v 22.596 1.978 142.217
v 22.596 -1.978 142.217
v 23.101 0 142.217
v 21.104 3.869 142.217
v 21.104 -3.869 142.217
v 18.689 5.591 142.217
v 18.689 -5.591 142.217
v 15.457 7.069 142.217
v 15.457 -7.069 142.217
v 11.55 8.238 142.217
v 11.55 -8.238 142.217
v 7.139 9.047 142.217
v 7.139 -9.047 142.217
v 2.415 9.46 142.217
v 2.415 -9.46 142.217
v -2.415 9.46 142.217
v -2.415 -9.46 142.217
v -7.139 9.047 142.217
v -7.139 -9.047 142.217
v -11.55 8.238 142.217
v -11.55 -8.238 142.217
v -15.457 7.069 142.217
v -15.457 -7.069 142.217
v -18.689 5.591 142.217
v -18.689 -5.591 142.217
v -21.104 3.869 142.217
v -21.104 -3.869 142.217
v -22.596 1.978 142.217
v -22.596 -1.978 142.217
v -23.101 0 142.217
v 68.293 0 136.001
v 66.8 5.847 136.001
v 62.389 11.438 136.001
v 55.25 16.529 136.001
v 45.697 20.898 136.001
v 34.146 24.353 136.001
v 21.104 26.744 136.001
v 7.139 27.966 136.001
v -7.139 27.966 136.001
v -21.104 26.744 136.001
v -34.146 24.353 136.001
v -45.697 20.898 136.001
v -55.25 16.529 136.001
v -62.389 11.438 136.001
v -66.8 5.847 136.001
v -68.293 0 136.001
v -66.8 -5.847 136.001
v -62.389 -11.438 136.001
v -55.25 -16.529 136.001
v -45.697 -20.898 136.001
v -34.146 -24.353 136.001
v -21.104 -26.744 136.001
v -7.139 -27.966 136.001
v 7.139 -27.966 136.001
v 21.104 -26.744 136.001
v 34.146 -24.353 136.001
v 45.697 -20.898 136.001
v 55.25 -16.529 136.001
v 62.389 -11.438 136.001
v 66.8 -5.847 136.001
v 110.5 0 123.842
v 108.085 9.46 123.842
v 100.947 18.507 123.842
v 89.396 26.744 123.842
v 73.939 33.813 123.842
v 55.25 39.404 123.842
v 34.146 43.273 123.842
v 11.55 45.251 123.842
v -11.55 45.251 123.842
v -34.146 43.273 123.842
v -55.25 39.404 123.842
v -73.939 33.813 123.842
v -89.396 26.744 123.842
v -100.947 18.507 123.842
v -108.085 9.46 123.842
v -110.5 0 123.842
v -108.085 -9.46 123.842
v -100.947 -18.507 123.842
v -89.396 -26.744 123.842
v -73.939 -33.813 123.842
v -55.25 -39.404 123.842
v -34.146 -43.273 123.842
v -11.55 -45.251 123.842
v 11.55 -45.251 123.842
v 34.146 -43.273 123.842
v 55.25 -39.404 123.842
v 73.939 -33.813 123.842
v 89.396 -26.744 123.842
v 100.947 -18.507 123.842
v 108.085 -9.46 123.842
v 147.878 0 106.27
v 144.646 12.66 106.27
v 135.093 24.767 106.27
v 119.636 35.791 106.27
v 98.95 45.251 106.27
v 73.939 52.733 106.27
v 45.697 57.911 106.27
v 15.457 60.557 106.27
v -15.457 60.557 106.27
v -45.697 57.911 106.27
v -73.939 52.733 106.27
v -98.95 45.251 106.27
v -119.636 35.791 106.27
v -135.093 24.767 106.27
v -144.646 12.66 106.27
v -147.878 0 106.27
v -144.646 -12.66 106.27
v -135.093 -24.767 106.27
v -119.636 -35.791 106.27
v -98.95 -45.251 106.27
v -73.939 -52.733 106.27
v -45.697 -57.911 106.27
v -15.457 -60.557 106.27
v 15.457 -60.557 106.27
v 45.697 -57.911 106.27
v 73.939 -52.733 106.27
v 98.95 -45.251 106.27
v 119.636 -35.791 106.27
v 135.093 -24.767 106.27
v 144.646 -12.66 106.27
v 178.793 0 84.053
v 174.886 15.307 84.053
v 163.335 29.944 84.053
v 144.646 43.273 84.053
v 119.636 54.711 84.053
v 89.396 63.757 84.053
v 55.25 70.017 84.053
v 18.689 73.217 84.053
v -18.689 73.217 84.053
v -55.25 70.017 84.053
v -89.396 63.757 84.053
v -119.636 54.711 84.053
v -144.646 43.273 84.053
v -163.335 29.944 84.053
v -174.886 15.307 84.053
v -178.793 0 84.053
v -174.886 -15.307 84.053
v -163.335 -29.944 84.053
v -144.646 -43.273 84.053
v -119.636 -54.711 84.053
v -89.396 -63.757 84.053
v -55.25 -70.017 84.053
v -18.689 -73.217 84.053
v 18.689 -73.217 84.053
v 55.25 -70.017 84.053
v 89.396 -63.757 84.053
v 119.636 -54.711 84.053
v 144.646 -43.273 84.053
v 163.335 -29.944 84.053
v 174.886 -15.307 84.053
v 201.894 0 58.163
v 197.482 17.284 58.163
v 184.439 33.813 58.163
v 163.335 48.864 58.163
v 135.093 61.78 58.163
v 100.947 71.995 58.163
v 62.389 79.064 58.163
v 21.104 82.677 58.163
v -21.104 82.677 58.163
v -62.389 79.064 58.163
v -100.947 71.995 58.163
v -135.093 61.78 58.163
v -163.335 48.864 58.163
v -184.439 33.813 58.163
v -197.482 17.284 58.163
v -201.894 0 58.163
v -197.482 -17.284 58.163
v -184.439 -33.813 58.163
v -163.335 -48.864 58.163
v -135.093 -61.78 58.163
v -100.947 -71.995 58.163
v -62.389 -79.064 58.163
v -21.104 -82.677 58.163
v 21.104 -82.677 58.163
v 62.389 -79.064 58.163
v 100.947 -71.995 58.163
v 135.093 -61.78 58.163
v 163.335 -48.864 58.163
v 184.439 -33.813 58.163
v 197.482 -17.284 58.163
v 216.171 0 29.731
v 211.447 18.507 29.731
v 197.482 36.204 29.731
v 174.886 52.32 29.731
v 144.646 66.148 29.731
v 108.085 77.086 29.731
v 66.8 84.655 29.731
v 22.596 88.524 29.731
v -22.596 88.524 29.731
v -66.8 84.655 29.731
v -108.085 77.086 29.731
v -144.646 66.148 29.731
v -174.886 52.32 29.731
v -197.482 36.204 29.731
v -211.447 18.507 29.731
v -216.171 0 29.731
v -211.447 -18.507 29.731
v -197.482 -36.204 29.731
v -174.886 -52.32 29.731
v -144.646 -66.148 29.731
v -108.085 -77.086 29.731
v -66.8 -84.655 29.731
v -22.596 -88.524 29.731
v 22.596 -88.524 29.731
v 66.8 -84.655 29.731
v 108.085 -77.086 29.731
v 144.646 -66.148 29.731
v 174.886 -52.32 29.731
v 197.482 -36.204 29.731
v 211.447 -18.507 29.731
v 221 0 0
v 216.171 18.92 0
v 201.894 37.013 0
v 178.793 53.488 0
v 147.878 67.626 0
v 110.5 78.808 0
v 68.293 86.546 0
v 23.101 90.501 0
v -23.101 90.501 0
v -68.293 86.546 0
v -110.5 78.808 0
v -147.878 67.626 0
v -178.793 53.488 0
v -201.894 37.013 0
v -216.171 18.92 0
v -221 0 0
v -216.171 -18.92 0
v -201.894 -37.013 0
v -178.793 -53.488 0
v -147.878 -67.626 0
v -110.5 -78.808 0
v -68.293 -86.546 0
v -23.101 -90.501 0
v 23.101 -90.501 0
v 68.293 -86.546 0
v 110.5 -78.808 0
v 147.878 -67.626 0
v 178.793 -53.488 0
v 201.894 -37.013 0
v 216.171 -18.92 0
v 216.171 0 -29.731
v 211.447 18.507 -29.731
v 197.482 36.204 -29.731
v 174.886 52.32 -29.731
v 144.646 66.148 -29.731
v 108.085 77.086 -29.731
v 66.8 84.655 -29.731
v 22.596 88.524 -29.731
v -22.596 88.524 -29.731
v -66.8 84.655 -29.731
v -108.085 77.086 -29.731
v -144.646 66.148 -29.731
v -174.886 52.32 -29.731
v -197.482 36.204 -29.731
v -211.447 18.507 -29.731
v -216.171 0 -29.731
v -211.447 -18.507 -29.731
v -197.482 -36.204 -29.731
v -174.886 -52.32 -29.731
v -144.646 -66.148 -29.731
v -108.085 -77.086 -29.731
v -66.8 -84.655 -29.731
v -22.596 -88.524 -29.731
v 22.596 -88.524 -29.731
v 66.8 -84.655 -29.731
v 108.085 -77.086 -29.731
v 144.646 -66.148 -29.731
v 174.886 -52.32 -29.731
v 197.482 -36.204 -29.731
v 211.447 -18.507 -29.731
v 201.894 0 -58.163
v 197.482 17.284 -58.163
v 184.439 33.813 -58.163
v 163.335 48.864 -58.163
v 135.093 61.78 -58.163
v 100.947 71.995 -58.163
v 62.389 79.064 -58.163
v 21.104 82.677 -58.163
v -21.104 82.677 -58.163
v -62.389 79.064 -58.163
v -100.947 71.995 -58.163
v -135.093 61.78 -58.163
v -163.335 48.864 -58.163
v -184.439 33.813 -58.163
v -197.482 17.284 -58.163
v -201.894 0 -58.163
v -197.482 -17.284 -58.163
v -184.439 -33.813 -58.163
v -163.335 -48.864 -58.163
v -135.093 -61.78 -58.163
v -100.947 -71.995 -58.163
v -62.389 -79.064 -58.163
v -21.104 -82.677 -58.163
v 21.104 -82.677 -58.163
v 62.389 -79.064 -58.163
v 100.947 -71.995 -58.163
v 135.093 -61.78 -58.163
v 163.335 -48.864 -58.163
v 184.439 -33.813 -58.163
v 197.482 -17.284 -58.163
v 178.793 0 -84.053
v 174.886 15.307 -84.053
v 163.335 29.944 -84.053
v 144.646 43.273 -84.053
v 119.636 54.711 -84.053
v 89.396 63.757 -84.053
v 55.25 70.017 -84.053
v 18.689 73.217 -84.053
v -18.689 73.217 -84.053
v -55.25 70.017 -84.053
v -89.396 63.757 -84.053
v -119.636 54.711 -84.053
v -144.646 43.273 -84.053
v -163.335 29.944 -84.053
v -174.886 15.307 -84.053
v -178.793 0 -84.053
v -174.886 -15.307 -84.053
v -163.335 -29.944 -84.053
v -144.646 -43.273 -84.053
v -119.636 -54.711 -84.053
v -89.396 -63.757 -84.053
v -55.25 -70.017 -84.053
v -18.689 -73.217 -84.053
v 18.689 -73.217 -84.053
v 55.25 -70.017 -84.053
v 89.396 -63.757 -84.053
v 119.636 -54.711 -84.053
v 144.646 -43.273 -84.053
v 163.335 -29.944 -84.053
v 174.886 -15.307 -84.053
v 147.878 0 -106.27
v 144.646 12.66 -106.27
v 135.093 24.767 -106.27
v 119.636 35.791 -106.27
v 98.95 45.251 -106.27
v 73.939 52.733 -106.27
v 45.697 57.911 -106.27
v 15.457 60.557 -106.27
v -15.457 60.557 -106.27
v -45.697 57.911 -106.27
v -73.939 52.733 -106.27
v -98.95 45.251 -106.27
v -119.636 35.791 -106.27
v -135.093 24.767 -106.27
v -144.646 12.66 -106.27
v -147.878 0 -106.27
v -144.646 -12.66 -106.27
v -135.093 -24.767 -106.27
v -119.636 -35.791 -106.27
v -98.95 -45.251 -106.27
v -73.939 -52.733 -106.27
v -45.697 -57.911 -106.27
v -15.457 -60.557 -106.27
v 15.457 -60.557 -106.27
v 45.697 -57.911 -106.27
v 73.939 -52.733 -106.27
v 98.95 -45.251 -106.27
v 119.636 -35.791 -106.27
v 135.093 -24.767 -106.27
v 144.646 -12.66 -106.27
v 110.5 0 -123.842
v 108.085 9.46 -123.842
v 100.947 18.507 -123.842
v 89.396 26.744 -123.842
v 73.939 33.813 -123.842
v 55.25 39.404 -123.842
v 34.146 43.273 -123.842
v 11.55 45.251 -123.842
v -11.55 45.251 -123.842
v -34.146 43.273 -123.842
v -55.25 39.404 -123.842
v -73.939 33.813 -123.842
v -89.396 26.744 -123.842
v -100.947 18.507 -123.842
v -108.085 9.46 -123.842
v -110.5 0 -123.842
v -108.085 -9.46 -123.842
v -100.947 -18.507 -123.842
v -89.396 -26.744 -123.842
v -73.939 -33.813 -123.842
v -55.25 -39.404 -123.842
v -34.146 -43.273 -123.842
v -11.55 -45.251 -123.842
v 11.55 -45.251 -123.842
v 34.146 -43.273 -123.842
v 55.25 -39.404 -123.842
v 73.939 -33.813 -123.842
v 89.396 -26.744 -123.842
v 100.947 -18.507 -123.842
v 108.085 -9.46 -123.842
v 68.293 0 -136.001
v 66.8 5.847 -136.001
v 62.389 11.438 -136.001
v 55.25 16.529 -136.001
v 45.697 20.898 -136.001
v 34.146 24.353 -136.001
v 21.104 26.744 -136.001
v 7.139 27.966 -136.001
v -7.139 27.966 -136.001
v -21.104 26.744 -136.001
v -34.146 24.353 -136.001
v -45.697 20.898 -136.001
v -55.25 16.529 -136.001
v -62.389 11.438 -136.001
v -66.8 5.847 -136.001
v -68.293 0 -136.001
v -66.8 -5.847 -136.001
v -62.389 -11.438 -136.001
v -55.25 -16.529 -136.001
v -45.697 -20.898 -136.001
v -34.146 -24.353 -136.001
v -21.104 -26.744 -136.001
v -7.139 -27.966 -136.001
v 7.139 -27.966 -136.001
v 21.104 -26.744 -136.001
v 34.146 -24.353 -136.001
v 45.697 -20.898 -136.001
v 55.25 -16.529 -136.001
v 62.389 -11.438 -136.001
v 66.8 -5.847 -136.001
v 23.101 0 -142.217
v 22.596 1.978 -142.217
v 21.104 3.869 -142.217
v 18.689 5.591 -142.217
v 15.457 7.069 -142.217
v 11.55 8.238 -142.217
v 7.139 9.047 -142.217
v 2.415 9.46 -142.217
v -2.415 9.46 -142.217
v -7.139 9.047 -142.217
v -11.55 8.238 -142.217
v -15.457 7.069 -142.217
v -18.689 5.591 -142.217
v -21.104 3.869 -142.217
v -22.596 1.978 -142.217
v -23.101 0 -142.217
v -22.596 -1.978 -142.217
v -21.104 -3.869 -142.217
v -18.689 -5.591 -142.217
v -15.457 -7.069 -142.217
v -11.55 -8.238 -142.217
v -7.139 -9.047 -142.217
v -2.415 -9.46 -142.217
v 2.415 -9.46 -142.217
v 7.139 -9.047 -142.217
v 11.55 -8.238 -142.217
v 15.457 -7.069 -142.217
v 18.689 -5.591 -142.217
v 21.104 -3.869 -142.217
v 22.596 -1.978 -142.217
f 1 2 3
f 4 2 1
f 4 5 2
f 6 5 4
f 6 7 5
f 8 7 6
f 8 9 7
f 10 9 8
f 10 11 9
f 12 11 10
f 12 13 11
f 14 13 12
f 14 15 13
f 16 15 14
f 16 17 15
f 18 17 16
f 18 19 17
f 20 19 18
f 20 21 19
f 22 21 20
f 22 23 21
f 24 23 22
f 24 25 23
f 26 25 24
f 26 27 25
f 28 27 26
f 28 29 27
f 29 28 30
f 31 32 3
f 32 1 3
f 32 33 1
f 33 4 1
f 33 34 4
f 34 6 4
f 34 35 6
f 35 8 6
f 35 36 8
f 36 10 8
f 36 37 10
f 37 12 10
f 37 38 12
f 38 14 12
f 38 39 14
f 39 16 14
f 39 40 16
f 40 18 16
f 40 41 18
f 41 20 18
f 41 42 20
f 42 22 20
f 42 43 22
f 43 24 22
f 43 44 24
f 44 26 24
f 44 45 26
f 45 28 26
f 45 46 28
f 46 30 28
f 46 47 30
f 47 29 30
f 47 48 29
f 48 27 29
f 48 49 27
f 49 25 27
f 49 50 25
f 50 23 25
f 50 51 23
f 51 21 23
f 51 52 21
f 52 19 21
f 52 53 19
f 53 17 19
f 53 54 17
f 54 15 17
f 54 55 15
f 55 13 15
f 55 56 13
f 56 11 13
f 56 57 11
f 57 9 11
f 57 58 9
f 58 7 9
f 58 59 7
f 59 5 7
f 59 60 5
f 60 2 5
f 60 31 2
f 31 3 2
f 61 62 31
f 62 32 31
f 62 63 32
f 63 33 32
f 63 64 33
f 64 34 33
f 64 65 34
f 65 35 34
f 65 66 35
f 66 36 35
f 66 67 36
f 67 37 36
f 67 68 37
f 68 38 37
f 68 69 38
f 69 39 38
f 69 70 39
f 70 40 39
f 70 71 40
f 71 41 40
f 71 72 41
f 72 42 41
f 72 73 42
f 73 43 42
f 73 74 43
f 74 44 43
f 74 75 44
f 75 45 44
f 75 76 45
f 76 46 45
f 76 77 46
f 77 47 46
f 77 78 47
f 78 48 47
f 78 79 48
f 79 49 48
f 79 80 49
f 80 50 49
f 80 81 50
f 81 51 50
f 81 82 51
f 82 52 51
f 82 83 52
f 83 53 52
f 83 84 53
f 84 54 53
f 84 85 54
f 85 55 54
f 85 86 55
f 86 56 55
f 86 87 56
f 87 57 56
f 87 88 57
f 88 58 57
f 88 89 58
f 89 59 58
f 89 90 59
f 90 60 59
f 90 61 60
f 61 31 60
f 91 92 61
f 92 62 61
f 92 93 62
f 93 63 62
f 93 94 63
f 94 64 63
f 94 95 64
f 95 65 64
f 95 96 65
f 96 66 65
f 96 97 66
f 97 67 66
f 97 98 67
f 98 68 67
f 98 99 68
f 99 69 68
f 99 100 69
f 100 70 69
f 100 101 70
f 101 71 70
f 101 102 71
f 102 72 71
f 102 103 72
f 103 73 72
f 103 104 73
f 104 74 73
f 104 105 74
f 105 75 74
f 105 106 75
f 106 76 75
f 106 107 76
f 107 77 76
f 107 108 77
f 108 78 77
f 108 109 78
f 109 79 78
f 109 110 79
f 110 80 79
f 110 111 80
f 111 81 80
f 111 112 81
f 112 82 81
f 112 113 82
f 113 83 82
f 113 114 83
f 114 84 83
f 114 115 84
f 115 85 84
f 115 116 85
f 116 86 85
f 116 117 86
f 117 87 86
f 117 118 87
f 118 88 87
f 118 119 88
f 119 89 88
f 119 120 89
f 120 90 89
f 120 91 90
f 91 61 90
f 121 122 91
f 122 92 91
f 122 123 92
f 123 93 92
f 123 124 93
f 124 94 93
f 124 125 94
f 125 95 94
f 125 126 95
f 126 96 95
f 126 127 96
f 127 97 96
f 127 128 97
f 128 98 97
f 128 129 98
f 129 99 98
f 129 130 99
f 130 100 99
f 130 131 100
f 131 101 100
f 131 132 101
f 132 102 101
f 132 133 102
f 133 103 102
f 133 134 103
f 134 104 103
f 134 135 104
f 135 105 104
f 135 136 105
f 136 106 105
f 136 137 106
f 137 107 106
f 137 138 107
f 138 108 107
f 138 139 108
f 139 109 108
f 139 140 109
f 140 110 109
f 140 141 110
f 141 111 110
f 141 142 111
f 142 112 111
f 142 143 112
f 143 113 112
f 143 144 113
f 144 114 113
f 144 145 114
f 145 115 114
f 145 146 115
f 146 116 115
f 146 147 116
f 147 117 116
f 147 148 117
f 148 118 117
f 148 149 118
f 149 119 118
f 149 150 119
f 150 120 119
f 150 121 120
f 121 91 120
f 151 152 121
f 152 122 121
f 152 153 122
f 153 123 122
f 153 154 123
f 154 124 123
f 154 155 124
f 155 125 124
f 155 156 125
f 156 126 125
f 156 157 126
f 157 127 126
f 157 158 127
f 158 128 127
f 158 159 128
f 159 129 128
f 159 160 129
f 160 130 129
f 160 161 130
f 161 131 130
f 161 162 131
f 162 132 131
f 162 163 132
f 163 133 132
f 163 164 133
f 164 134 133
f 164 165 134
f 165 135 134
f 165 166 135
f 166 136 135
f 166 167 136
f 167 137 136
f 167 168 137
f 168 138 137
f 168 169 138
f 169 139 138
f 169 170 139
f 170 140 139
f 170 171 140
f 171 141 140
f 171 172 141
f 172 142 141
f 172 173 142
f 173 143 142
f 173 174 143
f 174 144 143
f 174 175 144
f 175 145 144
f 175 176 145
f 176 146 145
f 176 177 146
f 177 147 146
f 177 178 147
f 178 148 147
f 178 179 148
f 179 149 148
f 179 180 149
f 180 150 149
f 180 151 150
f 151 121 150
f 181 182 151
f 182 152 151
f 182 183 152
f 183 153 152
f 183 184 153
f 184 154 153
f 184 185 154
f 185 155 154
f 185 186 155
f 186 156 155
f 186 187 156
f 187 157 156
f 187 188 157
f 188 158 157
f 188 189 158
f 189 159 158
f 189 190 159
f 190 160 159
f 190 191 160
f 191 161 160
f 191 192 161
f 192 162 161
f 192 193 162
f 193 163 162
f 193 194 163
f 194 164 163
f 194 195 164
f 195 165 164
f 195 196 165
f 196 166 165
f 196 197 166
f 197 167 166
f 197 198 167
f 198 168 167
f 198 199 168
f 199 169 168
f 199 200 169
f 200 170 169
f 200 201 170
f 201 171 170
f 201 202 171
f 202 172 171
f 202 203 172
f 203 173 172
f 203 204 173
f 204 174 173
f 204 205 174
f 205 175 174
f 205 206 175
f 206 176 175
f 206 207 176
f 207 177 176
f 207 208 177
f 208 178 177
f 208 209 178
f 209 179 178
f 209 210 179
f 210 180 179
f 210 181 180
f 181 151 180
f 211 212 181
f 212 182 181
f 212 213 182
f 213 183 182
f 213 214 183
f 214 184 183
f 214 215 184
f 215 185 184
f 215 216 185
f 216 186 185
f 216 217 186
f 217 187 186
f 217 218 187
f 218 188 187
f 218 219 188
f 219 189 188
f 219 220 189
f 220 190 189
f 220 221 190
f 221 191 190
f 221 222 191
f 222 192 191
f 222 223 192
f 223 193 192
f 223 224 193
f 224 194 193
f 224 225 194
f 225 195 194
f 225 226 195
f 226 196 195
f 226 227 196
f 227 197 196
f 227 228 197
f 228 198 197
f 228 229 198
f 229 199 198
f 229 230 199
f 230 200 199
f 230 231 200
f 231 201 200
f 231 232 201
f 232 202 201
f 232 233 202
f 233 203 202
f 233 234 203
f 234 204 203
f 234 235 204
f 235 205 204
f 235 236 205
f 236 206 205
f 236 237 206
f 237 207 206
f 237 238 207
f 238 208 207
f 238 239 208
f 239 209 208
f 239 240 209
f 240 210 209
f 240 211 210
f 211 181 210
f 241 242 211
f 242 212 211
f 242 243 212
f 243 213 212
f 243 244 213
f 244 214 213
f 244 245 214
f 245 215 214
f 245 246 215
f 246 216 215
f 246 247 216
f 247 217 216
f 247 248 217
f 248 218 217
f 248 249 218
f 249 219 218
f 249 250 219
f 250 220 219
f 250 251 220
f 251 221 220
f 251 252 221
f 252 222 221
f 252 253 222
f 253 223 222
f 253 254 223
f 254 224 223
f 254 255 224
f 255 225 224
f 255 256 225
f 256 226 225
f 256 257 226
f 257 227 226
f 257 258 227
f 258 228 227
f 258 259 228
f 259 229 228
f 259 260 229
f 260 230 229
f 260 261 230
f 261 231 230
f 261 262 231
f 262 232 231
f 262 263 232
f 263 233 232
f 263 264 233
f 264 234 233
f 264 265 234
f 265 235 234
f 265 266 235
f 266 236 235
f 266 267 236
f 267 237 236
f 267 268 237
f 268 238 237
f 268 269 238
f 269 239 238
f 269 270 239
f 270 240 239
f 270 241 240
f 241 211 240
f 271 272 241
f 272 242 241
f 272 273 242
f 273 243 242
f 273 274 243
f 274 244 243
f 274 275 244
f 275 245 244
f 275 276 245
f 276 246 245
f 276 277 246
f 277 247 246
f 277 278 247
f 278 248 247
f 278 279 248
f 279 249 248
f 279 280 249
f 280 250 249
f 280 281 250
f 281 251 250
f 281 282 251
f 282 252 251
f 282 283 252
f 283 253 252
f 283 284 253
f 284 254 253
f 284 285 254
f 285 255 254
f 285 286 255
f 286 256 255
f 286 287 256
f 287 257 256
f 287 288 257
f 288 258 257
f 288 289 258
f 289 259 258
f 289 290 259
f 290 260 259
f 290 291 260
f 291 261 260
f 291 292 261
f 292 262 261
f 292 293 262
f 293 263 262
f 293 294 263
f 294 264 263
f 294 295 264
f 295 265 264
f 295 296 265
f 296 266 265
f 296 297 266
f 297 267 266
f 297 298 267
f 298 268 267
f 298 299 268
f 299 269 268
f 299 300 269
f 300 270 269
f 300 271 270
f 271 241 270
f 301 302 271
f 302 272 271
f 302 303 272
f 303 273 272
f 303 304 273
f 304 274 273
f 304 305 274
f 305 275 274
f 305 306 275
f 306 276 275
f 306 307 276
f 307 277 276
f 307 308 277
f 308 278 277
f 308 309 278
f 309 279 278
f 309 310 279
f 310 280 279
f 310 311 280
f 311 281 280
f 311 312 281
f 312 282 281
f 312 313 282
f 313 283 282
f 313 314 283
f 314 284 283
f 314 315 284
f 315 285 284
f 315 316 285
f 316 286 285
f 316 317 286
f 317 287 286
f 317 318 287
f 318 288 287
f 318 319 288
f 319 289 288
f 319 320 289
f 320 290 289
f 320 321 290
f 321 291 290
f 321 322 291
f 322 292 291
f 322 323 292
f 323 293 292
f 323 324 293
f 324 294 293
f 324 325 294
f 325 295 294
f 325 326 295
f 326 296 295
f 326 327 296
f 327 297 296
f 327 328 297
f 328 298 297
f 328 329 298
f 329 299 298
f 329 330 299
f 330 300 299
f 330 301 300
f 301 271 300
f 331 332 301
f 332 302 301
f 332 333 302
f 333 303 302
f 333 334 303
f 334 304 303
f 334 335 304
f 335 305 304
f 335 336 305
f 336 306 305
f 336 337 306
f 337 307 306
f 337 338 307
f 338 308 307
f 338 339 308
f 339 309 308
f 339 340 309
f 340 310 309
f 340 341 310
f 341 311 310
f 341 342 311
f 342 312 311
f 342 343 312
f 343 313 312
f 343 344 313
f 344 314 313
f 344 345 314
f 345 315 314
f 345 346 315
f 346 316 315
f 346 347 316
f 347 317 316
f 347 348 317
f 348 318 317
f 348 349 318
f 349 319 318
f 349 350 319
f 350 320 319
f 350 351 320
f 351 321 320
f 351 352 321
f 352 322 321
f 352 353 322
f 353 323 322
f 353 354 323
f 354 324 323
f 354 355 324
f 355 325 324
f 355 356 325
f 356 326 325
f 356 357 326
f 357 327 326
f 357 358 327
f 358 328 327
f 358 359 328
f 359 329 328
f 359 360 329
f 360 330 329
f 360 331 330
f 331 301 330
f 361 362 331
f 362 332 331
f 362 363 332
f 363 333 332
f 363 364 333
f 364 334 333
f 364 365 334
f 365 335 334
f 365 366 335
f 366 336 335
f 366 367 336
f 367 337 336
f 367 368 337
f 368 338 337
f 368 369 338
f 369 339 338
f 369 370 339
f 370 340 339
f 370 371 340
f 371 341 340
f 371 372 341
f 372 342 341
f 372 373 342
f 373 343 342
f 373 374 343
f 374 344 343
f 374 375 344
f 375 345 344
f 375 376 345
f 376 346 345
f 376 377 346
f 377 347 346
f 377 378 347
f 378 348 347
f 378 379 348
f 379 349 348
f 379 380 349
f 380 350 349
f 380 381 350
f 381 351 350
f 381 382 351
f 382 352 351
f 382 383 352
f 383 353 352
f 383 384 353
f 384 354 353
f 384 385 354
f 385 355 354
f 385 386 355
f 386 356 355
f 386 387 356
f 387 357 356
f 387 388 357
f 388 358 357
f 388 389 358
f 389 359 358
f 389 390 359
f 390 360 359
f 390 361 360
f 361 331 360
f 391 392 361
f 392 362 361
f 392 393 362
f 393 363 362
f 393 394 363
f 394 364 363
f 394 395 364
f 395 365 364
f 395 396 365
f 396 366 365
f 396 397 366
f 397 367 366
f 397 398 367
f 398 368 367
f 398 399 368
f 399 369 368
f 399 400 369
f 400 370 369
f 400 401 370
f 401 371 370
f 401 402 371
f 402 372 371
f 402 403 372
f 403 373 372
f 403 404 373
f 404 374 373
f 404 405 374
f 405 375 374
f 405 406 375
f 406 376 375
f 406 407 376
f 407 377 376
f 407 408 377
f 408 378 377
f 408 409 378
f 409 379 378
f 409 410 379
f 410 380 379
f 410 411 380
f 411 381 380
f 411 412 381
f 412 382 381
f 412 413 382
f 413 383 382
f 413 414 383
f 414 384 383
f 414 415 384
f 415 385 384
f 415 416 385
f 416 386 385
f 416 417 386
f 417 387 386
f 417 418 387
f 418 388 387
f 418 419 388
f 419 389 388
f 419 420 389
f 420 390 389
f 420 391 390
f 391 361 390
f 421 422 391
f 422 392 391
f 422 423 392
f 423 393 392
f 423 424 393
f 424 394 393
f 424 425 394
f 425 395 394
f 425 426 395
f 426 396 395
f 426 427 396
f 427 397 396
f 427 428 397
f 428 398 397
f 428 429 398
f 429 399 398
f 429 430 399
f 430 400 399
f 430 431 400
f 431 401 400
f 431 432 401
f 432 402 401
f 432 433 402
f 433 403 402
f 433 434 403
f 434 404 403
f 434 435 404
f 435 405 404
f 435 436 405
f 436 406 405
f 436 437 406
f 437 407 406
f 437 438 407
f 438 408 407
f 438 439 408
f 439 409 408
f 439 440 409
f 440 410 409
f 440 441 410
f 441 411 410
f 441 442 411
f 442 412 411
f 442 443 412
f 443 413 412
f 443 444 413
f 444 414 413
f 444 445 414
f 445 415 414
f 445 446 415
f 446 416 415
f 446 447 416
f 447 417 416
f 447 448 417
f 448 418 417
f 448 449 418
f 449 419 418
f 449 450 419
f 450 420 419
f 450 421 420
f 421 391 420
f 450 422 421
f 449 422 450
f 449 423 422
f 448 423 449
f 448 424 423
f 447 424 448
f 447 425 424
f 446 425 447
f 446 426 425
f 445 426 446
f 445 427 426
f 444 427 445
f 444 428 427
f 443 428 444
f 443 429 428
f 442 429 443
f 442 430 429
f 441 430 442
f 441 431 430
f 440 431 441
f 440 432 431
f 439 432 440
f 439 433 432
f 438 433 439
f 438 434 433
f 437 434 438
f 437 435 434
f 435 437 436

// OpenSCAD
// Generated by SolidPython 1.0.1 on 2020-07-29 00:46:52


scale(v = [17, 7, 11]) {
	sphere(r = 13);
}
/***********************************************
*********      SolidPython code:      **********
************************************************
 
# import packages: SolidPython
from solid import *
from solid.utils import *
from itertools import chain, combinations, permutations


class Resize:

    def __init__(self, scad_file):
        self.scad_file = scad_file
        #self.scad_file = import_scad(scad_file)
        # cone/cylinder param:
        self.r1 = 0
        self.r2 = 0
        self.h = 0
        # rectangular prism param:
        self.w = 0
        self.l = 0
        # ellipse param:
        self.r = 0

    # import OpenScad code (file name corresponds to shape)


    # classify shape + parameters
    def assign(self, param1, param2, param3):
        if self.scad_file == 'cone.scad':
            self.r1 = param1
            self.r2 = param2
            self.h = param3
        elif self.scad_file == 'cylinder.scad':
            self.r1 = param1
            self.r2 = param2
            self.h = param3
        elif self.scad_file == 'rectangularPrism.scad':
            self.h = param1
            self.l = param2
            self.w = param3
        else:
            self.r = param1
            self.h = param2

    # resize parameters
    def iterate(self):
        x = range(3, 20, 2)
        i = 1
        if self.scad_file == 'cone.scad':
            tempList = list(permutations(x, 2))
            for temp in tempList:
                param1 = temp[0]
                param2 = temp[1]
                filepath = 'produced_scad_files/' + 'cone' + str(param1) + '_' + str(param2) + '_' + '.scad'
                scad_render_to_file(cylinder(h=param1, r1=param2, r2=0), filepath)

        elif self.scad_file == 'cylinder.scad':
            tempList = list(permutations(x, 3))
            for temp in tempList:
                param1 = temp[0]
                param2 = temp[1]
                filepath = 'produced_scad_files/' + 'cylinder' + str(param1) + '_' + str(param2) + '_' + '.scad'
                scad_render_to_file(cylinder(h=param1, r1=param2, r2=param2), filepath)

        elif self.scad_file == 'rectangularPrism.scad':
            tempList = list(permutations(x, 3))
            for temp in tempList:
                param1 = temp[0]
                param2 = temp[1]
                param3 = temp[2]
                filepath = 'produced_scad_files/' + 'rectangularPrism' + str(param1) + '_' + str(param2) + '_' + str(
                    param3) + '.scad'
                scad_render_to_file(cube(size=(param1, param2, param3)), filepath)

        elif self.scad_file == 'ellipse.scad':
            tempList = list(permutations(x, 4))
            for temp in tempList:
                param1 = temp[0]
                param2 = temp[1]
                param3 = temp[2]
                param4 = temp[3]
                filepath = 'produced_scad_files/' + 'ellipse' + str(param1) + '_' + str(param2) + '_' + str(param3) + '_' + str(param4) + '.scad'
                scad_render_to_file(scale([param1, param2, param3])(sphere(r=param4)), filepath)

    def render_to_scadfile(self):
        scad_render_to_file(scad, 'example.scad') 
 
************************************************/
